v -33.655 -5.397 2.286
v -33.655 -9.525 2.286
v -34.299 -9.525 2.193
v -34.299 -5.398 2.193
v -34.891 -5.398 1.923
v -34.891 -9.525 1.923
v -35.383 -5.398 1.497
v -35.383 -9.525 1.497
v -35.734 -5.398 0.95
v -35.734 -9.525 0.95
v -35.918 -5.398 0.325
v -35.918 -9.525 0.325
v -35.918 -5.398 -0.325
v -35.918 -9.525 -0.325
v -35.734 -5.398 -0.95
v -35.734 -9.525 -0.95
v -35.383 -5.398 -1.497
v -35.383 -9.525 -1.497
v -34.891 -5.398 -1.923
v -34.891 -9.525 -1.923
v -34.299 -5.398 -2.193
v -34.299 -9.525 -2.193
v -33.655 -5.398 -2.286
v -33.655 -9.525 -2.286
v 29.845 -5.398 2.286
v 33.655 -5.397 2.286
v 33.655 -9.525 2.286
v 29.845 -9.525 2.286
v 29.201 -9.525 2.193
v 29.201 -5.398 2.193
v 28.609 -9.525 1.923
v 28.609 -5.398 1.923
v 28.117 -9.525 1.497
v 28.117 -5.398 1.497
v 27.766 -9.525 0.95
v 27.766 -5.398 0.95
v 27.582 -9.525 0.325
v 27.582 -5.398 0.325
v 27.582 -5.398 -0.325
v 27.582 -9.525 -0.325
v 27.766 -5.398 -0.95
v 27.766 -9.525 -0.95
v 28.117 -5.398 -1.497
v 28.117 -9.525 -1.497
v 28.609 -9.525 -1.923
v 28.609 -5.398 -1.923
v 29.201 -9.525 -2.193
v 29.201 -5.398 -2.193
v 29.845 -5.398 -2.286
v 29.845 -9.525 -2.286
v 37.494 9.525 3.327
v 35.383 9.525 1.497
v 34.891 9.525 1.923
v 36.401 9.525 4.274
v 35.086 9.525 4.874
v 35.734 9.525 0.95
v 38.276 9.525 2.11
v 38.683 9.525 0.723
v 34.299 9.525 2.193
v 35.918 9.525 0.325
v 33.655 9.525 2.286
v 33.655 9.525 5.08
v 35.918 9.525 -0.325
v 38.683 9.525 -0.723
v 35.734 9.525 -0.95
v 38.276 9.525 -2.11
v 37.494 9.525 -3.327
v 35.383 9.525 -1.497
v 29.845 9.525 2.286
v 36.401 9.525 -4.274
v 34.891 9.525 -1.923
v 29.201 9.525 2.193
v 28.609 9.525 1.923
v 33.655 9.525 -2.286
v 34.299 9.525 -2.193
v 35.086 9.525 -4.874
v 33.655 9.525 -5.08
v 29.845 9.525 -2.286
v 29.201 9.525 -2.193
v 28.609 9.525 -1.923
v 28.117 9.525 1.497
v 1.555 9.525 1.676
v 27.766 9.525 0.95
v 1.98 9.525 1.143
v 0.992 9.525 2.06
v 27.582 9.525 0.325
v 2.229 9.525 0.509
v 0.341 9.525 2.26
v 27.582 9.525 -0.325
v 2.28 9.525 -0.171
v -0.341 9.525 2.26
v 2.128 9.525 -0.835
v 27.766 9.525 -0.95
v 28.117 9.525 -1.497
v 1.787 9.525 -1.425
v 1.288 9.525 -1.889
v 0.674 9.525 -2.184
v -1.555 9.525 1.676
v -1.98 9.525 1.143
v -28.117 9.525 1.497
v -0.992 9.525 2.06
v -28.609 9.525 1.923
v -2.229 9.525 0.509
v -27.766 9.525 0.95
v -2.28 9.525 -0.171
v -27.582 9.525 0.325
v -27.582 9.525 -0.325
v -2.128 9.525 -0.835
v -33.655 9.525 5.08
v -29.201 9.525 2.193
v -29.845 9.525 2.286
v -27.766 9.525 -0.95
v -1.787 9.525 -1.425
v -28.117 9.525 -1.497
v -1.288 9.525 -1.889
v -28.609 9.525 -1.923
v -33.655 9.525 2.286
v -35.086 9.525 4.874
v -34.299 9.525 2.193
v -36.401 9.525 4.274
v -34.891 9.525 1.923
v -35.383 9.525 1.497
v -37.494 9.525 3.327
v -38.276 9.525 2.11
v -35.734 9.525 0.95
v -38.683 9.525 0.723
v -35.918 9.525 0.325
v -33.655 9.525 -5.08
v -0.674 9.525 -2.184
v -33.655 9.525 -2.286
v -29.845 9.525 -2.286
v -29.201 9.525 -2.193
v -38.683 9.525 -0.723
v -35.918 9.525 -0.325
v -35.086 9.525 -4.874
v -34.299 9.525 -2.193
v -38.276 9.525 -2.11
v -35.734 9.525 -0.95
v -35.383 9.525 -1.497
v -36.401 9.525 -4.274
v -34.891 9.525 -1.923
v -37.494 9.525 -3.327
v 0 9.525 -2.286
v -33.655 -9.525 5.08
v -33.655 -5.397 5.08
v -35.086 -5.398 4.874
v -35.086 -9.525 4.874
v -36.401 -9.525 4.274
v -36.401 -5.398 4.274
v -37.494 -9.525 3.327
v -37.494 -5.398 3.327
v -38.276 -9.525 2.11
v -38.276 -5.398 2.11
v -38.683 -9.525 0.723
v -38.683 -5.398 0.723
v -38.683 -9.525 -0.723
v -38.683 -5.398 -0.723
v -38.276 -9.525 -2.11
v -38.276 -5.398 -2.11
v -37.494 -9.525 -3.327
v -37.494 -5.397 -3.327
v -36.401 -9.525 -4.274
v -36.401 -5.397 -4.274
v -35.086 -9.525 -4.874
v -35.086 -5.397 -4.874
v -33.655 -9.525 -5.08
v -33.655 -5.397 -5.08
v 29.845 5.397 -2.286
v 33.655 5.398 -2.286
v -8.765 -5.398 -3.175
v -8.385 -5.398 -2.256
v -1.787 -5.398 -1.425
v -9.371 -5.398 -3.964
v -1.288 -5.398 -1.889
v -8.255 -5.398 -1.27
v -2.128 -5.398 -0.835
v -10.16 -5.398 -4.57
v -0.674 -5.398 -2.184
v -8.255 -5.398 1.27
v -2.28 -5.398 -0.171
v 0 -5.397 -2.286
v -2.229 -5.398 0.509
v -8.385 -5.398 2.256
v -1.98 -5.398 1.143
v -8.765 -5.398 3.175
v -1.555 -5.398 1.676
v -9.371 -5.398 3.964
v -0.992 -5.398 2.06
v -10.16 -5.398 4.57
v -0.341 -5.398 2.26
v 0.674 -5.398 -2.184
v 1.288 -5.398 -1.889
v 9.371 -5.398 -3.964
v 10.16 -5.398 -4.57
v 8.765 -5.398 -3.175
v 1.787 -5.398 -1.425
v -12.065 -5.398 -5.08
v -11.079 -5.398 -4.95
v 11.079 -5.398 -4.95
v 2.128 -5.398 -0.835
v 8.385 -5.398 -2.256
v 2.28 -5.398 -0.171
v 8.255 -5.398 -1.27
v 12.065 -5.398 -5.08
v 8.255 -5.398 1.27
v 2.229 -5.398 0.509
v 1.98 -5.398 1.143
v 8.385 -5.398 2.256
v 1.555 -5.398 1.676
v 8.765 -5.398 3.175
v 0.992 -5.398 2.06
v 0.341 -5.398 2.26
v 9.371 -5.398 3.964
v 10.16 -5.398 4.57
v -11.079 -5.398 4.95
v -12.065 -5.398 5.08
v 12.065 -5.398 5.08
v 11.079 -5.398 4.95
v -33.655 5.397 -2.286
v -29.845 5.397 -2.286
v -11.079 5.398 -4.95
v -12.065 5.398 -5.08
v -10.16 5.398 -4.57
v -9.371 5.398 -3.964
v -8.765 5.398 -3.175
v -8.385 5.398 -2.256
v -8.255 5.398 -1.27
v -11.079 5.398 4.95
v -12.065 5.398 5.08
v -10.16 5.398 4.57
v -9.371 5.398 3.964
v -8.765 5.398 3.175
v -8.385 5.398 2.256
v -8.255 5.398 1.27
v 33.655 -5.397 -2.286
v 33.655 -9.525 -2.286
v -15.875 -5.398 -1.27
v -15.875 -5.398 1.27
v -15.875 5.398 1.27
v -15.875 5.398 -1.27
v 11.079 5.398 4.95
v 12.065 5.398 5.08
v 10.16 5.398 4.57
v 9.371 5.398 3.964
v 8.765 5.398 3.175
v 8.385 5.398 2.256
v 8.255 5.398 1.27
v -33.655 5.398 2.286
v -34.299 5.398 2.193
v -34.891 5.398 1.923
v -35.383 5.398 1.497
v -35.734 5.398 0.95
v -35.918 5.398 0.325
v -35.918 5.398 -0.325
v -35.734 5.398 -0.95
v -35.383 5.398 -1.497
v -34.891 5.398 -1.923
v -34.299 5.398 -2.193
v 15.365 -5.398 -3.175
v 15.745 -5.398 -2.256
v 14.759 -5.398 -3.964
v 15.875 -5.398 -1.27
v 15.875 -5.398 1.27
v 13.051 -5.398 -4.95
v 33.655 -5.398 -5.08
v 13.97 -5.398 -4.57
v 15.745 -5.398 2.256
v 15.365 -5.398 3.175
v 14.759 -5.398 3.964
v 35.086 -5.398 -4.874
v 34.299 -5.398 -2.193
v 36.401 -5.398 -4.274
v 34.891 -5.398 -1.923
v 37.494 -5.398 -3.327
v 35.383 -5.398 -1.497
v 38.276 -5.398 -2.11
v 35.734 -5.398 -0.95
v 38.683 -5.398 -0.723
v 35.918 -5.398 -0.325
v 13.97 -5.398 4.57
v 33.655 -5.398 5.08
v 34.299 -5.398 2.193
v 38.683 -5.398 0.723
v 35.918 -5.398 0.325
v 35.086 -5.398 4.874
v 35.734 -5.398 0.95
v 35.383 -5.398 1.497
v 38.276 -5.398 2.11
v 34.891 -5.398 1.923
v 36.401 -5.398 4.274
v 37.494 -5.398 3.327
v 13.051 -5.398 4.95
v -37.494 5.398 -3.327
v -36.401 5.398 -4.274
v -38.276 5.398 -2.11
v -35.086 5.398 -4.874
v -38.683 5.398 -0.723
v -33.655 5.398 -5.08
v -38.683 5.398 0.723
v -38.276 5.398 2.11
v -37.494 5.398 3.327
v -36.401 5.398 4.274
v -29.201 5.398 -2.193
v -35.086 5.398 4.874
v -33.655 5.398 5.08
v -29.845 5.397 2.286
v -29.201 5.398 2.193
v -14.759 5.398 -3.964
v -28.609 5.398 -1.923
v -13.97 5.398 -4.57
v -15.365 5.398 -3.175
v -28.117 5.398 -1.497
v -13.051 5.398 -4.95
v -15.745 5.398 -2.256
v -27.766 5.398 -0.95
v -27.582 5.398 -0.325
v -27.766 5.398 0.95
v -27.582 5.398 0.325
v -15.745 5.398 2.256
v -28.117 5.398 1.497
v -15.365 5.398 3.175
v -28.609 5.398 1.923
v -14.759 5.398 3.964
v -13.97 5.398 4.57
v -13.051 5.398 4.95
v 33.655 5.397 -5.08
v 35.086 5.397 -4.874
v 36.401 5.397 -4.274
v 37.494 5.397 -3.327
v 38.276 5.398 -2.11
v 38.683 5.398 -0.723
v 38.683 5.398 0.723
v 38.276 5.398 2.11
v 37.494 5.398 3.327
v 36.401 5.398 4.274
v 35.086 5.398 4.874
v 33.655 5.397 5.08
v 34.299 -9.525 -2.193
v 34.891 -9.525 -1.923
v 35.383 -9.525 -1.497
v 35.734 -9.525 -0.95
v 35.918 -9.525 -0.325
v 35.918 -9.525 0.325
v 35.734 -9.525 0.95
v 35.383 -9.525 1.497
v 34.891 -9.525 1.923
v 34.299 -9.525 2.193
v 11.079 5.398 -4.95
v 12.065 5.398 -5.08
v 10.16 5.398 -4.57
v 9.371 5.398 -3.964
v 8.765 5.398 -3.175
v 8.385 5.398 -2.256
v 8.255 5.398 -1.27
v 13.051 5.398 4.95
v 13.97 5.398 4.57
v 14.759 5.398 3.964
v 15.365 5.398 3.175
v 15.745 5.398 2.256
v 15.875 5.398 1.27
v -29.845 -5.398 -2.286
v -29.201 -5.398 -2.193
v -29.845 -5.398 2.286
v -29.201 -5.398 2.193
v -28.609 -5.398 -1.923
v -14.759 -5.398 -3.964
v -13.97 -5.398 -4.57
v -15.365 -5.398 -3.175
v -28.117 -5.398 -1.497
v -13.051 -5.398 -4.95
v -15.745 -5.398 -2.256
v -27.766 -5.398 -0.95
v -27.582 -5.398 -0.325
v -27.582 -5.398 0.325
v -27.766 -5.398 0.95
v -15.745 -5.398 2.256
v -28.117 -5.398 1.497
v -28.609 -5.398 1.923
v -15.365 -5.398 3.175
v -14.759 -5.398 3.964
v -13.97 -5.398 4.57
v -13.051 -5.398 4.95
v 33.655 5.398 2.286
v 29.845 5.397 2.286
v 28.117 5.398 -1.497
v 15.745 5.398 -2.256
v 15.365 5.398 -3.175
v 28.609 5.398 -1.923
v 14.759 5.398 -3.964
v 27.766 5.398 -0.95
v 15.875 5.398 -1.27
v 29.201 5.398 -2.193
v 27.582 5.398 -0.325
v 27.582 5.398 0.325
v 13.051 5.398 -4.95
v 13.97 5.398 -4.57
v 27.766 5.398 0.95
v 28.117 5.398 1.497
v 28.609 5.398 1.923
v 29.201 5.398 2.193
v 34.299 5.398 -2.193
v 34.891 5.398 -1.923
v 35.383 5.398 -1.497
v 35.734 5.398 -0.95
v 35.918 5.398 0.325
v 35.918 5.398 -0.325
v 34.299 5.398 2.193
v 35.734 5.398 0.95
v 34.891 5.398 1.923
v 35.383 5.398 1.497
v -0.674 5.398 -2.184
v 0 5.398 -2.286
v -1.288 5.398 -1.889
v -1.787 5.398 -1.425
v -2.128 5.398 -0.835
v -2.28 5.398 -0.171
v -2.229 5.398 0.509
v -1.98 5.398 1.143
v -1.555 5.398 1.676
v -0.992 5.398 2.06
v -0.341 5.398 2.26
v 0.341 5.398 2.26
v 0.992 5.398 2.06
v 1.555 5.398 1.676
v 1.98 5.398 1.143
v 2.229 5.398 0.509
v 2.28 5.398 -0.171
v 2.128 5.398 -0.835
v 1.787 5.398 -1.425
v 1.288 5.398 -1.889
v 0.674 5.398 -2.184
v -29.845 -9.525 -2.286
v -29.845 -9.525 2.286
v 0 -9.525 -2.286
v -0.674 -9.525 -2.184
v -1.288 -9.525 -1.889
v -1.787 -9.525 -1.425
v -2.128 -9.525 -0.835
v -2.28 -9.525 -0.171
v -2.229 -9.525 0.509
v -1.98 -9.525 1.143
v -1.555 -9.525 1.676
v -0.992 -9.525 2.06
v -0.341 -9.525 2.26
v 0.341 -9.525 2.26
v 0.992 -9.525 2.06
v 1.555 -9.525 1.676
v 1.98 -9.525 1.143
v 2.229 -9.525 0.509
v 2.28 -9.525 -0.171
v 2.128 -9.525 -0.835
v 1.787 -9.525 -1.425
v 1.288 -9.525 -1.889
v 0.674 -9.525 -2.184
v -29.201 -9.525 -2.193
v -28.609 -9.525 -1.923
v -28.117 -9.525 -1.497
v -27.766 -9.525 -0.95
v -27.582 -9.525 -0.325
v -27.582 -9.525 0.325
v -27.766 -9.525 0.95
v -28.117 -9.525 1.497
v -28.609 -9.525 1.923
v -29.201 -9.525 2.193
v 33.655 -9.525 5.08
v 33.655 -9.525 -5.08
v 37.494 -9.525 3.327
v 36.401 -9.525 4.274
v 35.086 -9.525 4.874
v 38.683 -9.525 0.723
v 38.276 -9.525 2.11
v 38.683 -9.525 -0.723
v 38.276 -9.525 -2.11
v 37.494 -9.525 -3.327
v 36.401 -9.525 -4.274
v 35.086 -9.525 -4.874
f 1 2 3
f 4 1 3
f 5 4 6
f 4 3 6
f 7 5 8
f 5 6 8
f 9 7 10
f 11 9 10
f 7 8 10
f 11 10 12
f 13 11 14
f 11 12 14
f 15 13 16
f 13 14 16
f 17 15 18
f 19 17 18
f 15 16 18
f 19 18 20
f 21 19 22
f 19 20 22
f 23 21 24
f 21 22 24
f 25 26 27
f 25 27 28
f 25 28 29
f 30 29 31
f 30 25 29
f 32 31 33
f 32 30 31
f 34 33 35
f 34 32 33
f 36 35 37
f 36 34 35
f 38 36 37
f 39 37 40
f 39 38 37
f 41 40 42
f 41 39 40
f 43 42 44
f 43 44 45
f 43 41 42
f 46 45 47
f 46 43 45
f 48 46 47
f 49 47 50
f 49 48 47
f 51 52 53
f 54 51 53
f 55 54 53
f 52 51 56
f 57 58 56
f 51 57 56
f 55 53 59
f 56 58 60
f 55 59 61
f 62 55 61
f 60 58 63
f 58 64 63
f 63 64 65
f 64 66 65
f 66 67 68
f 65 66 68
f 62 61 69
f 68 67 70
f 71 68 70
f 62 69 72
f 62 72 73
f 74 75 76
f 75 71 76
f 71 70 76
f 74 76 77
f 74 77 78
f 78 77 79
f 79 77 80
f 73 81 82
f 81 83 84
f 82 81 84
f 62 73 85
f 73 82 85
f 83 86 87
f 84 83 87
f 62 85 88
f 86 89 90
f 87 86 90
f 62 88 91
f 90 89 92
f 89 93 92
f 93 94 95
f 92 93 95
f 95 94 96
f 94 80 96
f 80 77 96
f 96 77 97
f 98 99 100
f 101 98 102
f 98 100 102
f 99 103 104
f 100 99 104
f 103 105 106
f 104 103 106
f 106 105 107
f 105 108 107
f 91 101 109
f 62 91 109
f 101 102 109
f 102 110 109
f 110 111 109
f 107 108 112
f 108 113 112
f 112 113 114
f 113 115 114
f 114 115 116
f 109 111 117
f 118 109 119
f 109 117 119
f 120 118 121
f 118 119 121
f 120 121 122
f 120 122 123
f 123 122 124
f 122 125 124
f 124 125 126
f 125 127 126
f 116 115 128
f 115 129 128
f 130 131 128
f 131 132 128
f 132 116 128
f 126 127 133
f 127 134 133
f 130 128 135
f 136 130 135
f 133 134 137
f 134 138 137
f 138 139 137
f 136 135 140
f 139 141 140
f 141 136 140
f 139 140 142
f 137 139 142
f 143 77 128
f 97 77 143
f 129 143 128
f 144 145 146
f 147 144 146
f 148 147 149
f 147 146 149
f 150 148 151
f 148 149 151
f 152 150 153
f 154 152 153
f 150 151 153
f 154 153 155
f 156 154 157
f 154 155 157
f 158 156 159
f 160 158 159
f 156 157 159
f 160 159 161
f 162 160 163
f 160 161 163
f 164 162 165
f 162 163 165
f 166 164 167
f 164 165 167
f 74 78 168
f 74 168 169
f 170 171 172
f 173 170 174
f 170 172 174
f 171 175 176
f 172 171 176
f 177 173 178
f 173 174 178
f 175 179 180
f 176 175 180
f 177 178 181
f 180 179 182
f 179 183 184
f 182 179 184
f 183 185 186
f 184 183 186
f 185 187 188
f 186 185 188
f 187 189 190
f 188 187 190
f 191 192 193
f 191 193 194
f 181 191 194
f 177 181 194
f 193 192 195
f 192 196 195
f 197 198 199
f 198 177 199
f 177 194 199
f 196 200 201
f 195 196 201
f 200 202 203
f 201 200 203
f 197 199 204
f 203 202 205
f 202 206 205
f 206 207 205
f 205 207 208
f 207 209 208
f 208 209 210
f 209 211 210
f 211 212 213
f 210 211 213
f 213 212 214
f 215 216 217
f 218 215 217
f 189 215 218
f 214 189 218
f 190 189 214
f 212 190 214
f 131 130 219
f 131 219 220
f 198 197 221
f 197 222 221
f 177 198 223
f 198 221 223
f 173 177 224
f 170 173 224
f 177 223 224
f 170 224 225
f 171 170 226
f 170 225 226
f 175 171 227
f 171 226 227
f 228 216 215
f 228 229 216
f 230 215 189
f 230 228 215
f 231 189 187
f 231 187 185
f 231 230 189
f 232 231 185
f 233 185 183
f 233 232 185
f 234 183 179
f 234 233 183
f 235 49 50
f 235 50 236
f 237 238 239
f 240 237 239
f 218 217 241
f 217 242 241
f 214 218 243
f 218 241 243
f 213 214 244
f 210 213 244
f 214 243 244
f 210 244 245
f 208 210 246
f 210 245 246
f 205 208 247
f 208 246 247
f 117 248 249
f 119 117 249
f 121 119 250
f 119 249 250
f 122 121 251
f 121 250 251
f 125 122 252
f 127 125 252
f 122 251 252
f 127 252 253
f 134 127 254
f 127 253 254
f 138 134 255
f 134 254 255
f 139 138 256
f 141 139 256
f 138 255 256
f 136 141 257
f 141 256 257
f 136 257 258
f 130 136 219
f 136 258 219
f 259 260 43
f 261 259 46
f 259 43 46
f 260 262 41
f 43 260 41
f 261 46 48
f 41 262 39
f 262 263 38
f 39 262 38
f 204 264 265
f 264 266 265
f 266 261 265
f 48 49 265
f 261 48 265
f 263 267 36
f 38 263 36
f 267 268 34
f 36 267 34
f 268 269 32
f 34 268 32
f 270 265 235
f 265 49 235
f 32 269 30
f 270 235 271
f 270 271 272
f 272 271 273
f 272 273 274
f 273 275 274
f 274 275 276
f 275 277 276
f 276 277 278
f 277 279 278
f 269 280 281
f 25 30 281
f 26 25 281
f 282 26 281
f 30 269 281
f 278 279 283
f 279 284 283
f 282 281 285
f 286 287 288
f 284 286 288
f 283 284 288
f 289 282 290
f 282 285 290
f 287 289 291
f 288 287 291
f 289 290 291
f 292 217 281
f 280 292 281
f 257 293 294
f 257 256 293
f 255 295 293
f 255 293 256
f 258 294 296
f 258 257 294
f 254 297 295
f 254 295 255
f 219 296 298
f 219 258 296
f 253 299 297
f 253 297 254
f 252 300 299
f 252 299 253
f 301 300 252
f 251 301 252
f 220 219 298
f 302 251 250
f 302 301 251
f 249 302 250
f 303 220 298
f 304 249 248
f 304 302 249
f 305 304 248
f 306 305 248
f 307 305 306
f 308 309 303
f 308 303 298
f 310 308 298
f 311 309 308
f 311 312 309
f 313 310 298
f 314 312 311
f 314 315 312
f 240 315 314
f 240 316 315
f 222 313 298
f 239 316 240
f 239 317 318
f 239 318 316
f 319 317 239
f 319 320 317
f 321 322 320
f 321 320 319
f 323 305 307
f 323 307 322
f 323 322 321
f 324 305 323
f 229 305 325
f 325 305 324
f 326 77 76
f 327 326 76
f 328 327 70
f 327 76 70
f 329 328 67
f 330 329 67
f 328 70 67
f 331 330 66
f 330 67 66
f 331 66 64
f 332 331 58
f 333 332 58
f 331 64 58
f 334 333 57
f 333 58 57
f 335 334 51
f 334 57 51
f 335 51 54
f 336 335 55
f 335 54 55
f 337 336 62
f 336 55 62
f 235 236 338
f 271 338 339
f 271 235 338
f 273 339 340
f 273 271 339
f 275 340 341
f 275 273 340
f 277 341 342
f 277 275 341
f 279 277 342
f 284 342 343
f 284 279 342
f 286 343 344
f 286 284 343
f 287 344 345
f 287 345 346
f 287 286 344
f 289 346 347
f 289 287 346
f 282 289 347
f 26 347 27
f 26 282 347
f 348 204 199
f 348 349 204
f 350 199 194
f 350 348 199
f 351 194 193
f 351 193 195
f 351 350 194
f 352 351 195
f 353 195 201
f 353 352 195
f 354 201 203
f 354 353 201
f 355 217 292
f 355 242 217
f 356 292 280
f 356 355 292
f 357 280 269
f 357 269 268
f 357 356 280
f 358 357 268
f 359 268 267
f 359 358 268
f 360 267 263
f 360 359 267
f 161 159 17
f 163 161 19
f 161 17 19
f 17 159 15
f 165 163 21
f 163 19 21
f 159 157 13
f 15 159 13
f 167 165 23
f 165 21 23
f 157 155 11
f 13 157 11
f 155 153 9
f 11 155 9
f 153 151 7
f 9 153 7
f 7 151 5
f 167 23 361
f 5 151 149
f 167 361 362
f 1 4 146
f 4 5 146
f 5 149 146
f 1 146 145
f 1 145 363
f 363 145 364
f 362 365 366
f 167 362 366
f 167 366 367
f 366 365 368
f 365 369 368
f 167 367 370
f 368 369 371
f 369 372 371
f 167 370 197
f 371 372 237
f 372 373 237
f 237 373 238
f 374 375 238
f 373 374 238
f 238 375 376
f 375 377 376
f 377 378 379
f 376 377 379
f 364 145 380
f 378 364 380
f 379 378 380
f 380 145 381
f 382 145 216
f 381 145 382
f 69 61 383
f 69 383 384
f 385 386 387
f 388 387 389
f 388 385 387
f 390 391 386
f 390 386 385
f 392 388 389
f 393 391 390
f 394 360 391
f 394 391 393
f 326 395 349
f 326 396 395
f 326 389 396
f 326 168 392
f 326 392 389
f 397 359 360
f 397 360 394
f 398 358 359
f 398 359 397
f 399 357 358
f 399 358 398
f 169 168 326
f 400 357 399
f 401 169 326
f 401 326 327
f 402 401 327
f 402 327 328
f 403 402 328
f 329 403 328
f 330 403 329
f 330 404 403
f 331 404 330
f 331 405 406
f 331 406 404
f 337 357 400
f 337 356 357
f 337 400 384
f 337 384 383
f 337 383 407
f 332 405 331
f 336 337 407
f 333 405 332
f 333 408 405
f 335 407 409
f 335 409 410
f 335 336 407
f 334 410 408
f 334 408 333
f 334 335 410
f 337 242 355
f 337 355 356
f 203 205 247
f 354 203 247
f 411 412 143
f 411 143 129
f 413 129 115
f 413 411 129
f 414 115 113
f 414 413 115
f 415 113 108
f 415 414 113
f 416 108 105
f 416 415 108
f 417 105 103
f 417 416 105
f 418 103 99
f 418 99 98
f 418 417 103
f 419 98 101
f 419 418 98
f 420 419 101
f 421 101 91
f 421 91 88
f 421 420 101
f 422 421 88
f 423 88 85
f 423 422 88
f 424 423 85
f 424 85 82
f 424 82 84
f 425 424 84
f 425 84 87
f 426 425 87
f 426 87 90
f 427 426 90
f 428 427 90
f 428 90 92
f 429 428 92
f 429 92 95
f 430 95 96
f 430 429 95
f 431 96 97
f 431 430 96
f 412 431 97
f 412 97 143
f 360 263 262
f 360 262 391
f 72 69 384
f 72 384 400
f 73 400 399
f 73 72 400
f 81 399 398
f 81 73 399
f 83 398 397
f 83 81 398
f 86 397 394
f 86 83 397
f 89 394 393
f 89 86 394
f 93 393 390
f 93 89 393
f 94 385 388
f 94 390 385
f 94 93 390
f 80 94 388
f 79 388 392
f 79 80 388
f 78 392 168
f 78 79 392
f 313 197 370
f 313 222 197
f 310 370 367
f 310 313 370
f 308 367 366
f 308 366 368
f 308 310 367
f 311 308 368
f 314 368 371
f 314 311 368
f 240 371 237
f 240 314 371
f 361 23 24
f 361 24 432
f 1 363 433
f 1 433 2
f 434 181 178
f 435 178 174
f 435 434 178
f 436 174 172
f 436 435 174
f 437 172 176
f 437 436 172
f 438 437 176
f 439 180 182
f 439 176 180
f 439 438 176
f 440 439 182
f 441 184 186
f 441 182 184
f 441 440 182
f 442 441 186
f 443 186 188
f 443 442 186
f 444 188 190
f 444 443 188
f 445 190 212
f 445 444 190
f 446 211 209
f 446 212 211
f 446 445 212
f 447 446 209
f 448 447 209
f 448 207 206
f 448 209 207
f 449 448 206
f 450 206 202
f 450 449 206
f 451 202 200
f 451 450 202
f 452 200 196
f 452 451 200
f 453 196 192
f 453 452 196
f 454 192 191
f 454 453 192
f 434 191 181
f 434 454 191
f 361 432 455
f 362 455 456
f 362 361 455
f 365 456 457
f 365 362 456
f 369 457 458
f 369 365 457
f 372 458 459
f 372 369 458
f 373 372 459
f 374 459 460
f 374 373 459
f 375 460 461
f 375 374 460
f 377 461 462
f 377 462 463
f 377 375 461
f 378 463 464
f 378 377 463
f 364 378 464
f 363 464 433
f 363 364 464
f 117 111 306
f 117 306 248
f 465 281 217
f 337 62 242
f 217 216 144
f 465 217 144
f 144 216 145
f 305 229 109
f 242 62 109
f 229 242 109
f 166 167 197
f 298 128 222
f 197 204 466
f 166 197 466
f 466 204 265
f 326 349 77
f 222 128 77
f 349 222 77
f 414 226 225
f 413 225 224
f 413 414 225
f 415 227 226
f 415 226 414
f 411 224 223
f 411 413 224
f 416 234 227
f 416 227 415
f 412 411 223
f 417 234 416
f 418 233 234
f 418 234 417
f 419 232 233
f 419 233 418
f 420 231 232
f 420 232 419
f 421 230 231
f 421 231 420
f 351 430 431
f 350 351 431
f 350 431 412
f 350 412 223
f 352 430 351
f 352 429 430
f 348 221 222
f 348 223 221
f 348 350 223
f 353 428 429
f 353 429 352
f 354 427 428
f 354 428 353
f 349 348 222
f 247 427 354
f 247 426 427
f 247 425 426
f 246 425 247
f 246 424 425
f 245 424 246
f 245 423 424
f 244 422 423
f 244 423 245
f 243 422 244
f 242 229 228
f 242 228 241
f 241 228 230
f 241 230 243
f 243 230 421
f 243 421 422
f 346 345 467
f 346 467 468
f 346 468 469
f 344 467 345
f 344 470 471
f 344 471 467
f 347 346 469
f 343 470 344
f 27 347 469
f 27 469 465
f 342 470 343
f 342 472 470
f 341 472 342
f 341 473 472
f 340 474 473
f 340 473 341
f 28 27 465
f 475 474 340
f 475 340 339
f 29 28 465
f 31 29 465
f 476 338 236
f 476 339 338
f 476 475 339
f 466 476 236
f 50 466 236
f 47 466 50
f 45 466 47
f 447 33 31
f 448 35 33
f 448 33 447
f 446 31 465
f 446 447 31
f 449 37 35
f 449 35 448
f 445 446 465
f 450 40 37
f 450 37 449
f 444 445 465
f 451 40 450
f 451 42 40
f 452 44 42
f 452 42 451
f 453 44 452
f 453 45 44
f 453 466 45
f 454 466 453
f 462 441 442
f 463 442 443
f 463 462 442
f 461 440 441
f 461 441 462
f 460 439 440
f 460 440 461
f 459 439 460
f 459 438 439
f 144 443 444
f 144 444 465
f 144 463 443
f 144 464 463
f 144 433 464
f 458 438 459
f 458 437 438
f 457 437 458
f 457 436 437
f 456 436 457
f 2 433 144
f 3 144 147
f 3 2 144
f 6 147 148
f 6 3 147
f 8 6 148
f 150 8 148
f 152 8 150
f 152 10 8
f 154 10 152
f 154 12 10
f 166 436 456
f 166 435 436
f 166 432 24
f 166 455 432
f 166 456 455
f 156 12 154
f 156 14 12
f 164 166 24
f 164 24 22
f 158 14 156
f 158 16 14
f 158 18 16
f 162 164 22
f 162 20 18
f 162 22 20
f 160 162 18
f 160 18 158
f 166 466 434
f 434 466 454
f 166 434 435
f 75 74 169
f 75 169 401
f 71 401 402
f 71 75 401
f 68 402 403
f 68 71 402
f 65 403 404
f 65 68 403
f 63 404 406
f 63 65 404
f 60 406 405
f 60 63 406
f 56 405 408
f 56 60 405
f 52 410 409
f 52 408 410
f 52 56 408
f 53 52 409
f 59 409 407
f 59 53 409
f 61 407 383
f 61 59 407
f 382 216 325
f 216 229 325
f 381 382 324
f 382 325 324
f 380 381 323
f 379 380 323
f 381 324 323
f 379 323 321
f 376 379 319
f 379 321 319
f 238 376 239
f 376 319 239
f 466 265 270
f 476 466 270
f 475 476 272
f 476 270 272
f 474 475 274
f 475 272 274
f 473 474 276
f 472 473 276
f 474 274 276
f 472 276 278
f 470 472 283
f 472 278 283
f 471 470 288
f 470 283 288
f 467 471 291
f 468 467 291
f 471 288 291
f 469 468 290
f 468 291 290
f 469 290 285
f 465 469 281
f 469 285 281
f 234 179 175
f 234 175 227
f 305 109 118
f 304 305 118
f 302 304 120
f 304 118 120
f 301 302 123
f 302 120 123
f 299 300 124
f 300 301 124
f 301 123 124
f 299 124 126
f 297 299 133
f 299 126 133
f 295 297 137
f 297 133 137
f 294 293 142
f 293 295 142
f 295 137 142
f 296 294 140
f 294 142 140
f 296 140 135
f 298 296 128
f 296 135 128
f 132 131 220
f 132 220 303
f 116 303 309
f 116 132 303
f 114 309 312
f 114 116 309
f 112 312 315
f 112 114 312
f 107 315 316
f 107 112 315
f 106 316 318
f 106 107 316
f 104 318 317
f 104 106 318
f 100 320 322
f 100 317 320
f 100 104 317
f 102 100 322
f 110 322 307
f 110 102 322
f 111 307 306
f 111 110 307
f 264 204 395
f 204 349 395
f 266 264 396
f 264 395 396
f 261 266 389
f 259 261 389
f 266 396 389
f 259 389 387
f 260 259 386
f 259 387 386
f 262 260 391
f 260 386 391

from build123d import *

# Parameters (mm, degrees)
SKETCH1_R           = 2.286
BOSS_EXTRUDE1_DEPTH = 9.525
SKETCH3_W           = 22.86
SKETCH3_H           = 10.795
SKETCH3_W_2         = 16.51
CUT_EXTRUDE1_DEPTH  = 42.162500531
FILLET1_R           = 3.81


with BuildPart() as part:
    # Sketch1 → Boss-Extrude1 (new, symmetric)
    with BuildSketch(Plane(origin=(0, 0, 0), x_dir=(1, 0, 0), z_dir=(0, 1, 0))):
        with BuildLine():
            Line((33.655, -5.08), (-33.655, -5.08))
            ThreePointArc((-33.655, -5.08), (-38.735, 0), (-33.655, 5.08))
            Line((-33.655, 5.08), (33.655, 5.08))
            ThreePointArc((33.655, 5.08), (38.735, 0), (33.655, -5.08))
        make_face()
        with Locations(Location((0, 0, 0), (0, 0, 90))):
            Circle(SKETCH1_R, mode=Mode.SUBTRACT)
        with BuildLine():
            Line((33.655, -2.286), (29.845, -2.286))
            ThreePointArc((29.845, -2.286), (27.559, 0), (29.845, 2.286))
            Line((29.845, 2.286), (33.655, 2.286))
            ThreePointArc((33.655, 2.286), (35.941, 0), (33.655, -2.286))
        make_face(mode=Mode.SUBTRACT)
        with BuildLine():
            Line((-33.655, 2.286), (-29.845, 2.286))
            ThreePointArc((-29.845, 2.286), (-27.559, 0), (-29.845, -2.286))
            Line((-29.845, -2.286), (-33.655, -2.286))
            ThreePointArc((-33.655, -2.286), (-35.941, 0), (-33.655, 2.286))
        make_face(mode=Mode.SUBTRACT)
    extrude(amount=BOSS_EXTRUDE1_DEPTH, both=True)

    # Sketch3 → Cut-Extrude1 (cut, through all)
    with BuildSketch(Plane.XY.offset(5.08)):
        with Locations((-27.305, 0)):
            Rectangle(SKETCH3_W, SKETCH3_H)
        Rectangle(SKETCH3_W_2, SKETCH3_H)
        with Locations((27.305, 0)):
            Rectangle(SKETCH3_W, SKETCH3_H)
    extrude(amount=-CUT_EXTRUDE1_DEPTH, mode=Mode.SUBTRACT)

    # Fillet1
    fillet1_edges = [part.edges().sort_by_distance(p)[0] for p in [
        (15.875, 0, -5.08),
        (15.875, 0, 5.08),
        (-15.875, 0, 5.08),
        (-15.875, 0, -5.08),
        (-8.255, 0, -5.08),
        (8.255, 0, -5.08),
        (-8.255, 0, 5.08),
        (8.255, 0, 5.08),
    ]]
    fillet(fillet1_edges, radius=FILLET1_R - 0.0001)  # a hair under: the kernel refuses the full size


solid = part.part
